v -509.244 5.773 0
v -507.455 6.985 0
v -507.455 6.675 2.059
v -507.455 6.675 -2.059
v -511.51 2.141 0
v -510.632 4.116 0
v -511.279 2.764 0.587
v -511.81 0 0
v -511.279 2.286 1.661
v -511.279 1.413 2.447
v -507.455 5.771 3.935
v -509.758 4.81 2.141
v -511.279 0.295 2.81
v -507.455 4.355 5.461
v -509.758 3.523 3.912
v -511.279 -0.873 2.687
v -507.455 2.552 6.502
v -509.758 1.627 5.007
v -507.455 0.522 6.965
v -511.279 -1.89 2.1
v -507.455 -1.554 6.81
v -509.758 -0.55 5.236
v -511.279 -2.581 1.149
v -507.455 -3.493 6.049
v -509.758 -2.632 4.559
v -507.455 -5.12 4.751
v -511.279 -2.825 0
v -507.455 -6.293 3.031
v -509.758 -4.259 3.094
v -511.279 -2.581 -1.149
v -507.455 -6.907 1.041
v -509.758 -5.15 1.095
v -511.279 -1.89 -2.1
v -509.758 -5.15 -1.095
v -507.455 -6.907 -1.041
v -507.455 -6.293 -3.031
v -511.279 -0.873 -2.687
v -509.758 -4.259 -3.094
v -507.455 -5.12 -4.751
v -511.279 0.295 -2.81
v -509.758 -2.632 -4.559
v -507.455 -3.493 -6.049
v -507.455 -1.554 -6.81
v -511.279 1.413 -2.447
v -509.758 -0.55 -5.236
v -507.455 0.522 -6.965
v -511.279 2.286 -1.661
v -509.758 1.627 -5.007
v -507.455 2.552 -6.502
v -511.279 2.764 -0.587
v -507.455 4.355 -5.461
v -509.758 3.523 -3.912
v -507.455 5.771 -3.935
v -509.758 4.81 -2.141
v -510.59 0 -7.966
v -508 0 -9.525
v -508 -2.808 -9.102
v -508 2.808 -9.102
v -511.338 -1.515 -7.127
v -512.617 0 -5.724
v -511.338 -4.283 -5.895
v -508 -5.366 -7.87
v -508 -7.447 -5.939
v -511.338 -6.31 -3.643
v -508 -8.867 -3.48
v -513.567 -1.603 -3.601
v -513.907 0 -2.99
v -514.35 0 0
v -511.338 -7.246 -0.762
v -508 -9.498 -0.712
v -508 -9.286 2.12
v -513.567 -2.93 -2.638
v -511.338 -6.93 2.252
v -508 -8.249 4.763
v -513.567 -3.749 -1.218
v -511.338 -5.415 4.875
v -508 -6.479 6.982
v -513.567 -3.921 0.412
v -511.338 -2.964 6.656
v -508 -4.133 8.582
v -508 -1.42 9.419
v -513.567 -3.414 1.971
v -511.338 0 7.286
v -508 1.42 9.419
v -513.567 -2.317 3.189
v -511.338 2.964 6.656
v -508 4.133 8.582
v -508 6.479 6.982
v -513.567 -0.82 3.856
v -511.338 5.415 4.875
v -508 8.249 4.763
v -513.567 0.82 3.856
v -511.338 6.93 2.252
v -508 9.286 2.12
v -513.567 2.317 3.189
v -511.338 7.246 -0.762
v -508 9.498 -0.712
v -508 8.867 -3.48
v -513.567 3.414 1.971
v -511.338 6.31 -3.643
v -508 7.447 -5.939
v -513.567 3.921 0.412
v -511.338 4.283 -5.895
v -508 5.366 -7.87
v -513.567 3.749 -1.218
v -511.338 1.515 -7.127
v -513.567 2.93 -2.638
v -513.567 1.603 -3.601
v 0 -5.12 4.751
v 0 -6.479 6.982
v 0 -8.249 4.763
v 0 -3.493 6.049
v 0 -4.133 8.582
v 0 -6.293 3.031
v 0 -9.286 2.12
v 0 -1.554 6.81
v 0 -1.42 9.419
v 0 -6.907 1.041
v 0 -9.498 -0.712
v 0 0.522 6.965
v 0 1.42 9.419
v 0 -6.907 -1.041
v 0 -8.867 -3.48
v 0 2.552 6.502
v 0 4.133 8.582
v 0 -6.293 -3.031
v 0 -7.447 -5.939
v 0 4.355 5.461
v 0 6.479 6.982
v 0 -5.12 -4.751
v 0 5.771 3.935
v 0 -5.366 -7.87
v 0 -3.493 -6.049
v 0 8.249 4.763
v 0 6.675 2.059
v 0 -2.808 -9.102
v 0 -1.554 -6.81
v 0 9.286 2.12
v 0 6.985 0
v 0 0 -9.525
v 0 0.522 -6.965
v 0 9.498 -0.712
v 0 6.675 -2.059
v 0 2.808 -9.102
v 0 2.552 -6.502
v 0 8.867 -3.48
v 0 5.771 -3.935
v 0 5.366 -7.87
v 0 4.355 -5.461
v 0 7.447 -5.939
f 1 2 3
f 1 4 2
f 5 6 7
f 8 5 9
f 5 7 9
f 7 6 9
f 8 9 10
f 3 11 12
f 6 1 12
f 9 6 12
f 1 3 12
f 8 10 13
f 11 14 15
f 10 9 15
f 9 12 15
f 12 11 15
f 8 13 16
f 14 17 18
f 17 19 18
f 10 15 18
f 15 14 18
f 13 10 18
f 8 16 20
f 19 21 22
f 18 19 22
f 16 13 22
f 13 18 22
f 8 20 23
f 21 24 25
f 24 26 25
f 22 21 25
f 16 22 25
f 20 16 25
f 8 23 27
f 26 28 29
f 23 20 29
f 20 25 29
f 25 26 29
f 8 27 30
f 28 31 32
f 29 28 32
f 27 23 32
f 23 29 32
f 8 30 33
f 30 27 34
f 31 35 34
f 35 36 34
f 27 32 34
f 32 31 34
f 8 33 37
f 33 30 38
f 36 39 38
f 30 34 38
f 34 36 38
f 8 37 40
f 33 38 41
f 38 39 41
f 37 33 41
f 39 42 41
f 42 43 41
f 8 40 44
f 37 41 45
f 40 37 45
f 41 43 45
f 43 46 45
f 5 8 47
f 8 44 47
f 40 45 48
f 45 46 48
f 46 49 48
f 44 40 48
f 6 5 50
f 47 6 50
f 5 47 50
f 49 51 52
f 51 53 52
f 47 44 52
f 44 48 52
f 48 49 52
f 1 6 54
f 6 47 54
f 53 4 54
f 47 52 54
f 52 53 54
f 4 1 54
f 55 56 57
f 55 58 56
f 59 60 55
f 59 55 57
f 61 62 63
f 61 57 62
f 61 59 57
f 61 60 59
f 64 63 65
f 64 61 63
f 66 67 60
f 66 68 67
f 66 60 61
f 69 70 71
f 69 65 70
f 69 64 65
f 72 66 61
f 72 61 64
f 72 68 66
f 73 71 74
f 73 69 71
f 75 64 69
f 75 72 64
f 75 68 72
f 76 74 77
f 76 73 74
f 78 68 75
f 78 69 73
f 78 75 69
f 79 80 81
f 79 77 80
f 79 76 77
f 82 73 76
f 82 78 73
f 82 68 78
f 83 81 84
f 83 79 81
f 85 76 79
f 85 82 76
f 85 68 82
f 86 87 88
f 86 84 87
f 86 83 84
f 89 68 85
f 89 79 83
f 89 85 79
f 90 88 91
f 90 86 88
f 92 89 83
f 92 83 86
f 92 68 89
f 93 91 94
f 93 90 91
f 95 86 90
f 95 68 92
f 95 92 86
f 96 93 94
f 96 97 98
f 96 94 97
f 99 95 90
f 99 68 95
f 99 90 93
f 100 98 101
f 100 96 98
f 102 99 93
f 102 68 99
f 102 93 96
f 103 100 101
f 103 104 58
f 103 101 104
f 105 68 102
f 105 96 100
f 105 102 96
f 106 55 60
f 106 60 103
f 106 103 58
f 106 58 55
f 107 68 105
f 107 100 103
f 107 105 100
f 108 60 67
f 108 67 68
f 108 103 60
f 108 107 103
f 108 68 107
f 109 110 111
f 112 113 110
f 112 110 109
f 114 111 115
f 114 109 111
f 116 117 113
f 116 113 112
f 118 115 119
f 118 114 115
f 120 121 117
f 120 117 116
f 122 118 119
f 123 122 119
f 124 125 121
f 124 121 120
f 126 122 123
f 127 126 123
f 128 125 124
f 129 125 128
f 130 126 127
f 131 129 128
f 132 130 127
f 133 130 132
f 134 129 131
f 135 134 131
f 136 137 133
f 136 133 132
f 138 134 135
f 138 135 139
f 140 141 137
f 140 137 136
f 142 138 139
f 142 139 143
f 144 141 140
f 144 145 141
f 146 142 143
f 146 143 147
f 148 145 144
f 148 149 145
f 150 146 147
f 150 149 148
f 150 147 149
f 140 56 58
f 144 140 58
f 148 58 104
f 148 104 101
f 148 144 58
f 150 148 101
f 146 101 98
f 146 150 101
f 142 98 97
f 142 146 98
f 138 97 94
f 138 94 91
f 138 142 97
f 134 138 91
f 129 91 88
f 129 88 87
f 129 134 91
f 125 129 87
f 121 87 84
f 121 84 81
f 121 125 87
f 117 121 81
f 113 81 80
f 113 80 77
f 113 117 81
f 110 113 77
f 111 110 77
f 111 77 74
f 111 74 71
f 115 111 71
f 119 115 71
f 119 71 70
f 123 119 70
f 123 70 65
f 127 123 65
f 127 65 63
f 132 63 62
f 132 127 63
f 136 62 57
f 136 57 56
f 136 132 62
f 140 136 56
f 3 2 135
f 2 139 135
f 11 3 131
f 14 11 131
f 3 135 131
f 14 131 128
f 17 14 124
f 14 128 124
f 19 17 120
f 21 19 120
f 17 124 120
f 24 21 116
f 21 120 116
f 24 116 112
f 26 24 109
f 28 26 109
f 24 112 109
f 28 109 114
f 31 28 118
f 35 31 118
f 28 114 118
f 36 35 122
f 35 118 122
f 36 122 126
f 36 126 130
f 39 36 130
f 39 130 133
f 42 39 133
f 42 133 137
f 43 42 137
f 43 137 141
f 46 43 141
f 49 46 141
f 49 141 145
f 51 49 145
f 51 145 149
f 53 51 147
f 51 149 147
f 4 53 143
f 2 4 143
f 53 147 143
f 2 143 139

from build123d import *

# Parameters (mm, degrees)
SKETCH1_R           = 9.525
BOSS_EXTRUDE1_DEPTH = 508
DOME1_FACE_RADIUS   = 9.525
DOME1_HEIGHT        = 6.35


# Read off the part's stored shape, not the designer's step: Shell1
with BuildPart() as part:
    # Sketch1 → Boss-Extrude1 (new body)
    with BuildSketch(Plane(origin=(0, 0, 0), x_dir=(0, 0, -1), z_dir=(1, 0, 0))):
        Circle(SKETCH1_R)
    extrude(amount=-BOSS_EXTRUDE1_DEPTH)

    # Dome1: a dome of height H over a round flat face of radius A is a cap of a sphere of radius (A * A + H * H) / (2 * H)
    dome1_r = (DOME1_FACE_RADIUS * DOME1_FACE_RADIUS + DOME1_HEIGHT * DOME1_HEIGHT) / (2 * DOME1_HEIGHT)
    dome1_base = Plane((-508, 0, 0), z_dir=(-1, 0, 0))
    with Locations(dome1_base.offset(DOME1_HEIGHT - dome1_r)):
        dome1_ball = Sphere(dome1_r, mode=Mode.PRIVATE)
    add(split(dome1_ball, bisect_by=dome1_base, keep=Keep.TOP, mode=Mode.PRIVATE))

    # Shell1 outline → Shell1 (revolve, cut)
    with BuildSketch(Plane.YX):
        with BuildLine():
            ThreePointArc((0, -511.81), (4.115838187, -510.631918722), (6.985000003, -507.454512554))
            Line((6.985000003, -507.454512554), (6.985, 0))
            Line((6.985, 0), (0, 0))
            Line((0, 0), (0, -511.81))
        make_face()
    revolve(axis=Axis((0, 0, 0), (1, 0, 0)), mode=Mode.SUBTRACT)


solid = part.part
